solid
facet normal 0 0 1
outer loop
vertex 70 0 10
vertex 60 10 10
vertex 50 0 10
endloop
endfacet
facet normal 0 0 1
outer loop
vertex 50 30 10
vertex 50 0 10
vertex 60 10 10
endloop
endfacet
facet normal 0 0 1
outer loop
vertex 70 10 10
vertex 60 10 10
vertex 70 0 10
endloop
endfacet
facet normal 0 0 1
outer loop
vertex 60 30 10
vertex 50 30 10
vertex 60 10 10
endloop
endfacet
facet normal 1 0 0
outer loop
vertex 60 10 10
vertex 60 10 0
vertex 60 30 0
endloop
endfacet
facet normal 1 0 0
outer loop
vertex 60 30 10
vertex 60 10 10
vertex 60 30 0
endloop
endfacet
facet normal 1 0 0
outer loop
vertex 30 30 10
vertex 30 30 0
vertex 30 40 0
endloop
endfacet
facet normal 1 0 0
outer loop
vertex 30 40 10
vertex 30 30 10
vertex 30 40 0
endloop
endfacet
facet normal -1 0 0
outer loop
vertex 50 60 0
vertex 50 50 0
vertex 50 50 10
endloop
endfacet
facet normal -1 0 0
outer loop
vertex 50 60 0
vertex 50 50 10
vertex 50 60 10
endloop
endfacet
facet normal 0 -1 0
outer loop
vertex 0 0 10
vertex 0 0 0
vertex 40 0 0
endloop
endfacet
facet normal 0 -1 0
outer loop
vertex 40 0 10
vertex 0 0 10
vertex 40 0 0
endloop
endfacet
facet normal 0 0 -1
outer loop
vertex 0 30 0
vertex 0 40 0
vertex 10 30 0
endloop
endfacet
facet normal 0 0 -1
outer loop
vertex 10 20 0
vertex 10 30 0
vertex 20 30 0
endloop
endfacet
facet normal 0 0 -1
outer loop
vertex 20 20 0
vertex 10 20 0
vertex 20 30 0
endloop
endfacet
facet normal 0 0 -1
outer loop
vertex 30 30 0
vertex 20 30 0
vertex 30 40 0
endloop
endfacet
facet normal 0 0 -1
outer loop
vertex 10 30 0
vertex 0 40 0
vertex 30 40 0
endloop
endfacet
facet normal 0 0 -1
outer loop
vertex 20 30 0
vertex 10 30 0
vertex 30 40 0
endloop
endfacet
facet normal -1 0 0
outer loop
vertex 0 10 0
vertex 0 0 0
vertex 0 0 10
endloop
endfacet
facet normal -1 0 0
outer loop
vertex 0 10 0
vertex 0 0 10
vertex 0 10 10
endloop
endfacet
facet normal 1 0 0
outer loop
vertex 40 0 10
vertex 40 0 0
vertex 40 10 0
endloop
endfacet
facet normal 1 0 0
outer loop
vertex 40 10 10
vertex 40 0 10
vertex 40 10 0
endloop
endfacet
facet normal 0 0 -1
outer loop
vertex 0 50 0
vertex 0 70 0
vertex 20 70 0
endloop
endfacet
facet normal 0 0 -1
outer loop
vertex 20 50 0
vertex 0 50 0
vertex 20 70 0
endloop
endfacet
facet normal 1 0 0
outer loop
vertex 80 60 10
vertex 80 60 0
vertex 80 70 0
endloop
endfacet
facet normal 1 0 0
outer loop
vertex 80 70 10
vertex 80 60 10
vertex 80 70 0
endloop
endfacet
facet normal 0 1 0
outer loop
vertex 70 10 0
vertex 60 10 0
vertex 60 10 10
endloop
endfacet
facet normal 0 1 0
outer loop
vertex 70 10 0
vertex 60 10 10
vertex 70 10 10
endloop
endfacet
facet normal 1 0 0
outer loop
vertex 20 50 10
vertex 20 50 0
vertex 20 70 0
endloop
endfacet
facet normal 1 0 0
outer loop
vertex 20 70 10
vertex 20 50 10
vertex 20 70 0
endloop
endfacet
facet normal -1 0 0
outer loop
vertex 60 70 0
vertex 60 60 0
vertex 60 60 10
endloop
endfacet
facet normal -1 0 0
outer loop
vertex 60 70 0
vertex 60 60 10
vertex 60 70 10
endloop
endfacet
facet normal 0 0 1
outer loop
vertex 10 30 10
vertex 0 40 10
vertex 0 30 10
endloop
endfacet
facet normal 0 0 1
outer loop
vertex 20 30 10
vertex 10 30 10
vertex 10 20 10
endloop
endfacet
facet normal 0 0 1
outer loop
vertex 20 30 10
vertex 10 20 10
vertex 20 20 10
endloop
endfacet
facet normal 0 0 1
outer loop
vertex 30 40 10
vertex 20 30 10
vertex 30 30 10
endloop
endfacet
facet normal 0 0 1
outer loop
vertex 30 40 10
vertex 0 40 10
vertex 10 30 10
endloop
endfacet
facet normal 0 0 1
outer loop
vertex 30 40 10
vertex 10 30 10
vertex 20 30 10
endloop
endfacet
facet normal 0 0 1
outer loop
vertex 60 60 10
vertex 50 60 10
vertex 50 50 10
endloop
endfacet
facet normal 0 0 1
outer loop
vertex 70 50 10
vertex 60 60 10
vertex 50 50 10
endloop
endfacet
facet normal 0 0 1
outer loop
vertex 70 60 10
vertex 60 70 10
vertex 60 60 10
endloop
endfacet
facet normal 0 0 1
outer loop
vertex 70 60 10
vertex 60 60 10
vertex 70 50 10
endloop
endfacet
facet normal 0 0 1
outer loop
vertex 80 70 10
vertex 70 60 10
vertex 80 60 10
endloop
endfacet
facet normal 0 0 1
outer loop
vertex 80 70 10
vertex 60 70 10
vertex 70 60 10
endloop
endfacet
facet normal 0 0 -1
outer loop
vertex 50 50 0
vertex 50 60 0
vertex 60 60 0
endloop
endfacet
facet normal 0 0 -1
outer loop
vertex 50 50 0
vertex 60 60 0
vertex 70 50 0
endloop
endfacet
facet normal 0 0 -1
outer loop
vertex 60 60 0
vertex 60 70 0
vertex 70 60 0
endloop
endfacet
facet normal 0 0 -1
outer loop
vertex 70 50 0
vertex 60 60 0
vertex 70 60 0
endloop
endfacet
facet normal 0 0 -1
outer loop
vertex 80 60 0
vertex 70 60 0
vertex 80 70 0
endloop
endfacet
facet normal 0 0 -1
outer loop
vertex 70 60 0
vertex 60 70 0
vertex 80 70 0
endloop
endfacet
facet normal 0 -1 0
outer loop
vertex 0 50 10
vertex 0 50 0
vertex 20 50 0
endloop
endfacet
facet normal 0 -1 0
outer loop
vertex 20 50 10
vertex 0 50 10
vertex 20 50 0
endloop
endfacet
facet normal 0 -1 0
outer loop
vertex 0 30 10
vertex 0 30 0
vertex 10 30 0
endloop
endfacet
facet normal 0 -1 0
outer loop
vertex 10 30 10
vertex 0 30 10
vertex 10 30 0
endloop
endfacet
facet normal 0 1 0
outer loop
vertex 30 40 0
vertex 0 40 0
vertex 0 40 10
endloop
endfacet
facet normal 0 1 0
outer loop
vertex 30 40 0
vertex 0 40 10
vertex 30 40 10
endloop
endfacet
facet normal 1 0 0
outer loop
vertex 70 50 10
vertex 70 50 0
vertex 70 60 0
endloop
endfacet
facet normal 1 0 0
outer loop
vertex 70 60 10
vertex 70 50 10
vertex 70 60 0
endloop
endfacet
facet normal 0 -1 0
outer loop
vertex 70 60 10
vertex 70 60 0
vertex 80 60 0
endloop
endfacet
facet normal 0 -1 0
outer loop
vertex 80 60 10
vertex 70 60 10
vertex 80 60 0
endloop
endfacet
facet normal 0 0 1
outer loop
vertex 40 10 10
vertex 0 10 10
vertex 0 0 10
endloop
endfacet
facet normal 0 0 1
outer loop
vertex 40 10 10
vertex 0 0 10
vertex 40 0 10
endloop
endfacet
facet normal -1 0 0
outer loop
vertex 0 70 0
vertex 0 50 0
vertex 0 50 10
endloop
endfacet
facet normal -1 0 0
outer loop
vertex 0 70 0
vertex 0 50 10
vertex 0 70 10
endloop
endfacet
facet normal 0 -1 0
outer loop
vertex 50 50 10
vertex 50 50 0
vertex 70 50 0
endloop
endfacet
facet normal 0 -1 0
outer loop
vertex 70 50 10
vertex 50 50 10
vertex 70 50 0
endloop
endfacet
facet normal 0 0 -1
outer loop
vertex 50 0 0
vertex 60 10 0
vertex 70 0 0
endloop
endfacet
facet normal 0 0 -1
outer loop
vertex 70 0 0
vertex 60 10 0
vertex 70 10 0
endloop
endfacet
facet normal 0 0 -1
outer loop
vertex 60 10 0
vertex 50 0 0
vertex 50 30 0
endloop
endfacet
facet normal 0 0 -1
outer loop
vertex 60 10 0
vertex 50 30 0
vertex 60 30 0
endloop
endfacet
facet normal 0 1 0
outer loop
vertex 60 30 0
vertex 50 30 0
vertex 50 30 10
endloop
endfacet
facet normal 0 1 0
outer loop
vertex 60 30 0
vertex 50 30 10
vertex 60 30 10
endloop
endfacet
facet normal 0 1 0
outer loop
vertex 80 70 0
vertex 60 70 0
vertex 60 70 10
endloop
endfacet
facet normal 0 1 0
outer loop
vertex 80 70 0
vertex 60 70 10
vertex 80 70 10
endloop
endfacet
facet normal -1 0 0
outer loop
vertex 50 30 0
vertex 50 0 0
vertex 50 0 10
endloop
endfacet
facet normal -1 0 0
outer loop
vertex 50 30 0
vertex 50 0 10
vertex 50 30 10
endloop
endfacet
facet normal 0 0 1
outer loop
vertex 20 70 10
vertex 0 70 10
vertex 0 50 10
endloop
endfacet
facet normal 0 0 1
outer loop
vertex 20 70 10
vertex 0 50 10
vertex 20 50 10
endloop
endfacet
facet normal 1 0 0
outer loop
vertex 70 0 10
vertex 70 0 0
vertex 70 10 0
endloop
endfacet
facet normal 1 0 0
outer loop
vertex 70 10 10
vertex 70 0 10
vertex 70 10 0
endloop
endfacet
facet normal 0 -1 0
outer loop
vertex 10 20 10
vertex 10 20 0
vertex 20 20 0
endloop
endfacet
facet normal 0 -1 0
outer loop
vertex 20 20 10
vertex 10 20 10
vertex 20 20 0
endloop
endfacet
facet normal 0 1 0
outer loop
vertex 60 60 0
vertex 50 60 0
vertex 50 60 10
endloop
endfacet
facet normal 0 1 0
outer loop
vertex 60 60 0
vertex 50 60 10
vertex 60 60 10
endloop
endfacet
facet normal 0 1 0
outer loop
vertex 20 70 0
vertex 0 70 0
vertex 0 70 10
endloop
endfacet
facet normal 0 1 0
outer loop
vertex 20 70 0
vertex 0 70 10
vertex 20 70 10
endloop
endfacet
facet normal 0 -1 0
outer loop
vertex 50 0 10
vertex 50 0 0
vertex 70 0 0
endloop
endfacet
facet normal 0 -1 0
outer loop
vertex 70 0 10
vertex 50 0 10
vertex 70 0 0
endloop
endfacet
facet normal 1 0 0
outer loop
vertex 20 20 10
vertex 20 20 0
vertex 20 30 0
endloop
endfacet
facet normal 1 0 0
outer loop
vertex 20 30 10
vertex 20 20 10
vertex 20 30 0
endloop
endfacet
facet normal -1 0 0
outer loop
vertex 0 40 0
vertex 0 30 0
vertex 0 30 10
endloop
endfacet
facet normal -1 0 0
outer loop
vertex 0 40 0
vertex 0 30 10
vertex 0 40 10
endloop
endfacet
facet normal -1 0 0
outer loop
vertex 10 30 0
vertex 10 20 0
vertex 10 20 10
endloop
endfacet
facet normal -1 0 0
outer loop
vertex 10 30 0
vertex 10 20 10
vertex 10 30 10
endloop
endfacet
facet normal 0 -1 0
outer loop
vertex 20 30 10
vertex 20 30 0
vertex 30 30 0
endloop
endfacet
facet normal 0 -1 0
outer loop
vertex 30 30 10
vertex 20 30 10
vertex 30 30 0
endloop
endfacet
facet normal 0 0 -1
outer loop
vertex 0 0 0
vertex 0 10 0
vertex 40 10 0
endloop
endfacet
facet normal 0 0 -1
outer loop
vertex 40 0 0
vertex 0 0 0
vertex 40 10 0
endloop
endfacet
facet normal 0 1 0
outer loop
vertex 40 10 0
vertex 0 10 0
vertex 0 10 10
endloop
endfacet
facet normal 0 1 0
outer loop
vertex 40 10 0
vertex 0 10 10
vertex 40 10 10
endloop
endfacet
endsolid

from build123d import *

# Parameters (mm, degrees)
BOX_W        = 40
BOX_H        = 10
BOX_DEPTH    = 10
BOX001_W     = 10
BOX001_H     = 10
BOX001_DEPTH = 10
BOX002_W     = 30
BOX002_H     = 10
BOX002_DEPTH = 10
BOX004_W     = 10
BOX004_H     = 30
BOX004_DEPTH = 10
BOX003_W     = 20
BOX003_H     = 10
BOX003_DEPTH = 10
BOX006_W     = 20
BOX006_H     = 10
BOX006_DEPTH = 10
BOX005_W     = 20
BOX005_H     = 10
BOX005_DEPTH = 10
BOX008_W     = 20
BOX008_H     = 10
BOX008_DEPTH = 10
BOX007_W     = 20
BOX007_H     = 10
BOX007_DEPTH = 10


with BuildPart() as box:
    # Box → Box (new body)
    with BuildSketch(Plane.XY):
        with Locations((20, 5)):
            Rectangle(BOX_W, BOX_H)
    extrude(amount=BOX_DEPTH)


with BuildPart() as cub001:
    # Box001 → Box001 (new body)
    with BuildSketch(Plane(origin=(10, 20, 0), x_dir=(1, 0, 0), z_dir=(0, 0, 1))):
        with Locations((5, 5)):
            Rectangle(BOX001_W, BOX001_H)
    extrude(amount=BOX001_DEPTH)


with BuildPart() as figura2:
    # Box002 → Box002 (new body)
    with BuildSketch(Plane(origin=(0, 30, 0), x_dir=(1, 0, 0), z_dir=(0, 0, 1))):
        with Locations((15, 5)):
            Rectangle(BOX002_W, BOX002_H)
    extrude(amount=BOX002_DEPTH)

    # Fusion: union Cub001
    add(cub001.part)


with BuildPart() as cub003:
    # Box004 → Box004 (new body)
    with BuildSketch(Plane(origin=(50, 0, 0), x_dir=(1, 0, 0), z_dir=(0, 0, 1))):
        with Locations((5, 15)):
            Rectangle(BOX004_W, BOX004_H)
    extrude(amount=BOX004_DEPTH)


with BuildPart() as figura3:
    # Box003 → Box003 (new body)
    with BuildSketch(Plane(origin=(50, 0, 0), x_dir=(1, 0, 0), z_dir=(0, 0, 1))):
        with Locations((10, 5)):
            Rectangle(BOX003_W, BOX003_H)
    extrude(amount=BOX003_DEPTH)

    # Fusion002: union Cub003
    add(cub003.part)


with BuildPart() as cub005:
    # Box006 → Box006 (new body)
    with BuildSketch(Plane(origin=(0, 60, 0), x_dir=(1, 0, 0), z_dir=(0, 0, 1))):
        with Locations((10, 5)):
            Rectangle(BOX006_W, BOX006_H)
    extrude(amount=BOX006_DEPTH)


with BuildPart() as fusion005:
    # Box005 → Box005 (new body)
    with BuildSketch(Plane(origin=(0, 50, 0), x_dir=(1, 0, 0), z_dir=(0, 0, 1))):
        with Locations((10, 5)):
            Rectangle(BOX005_W, BOX005_H)
    extrude(amount=BOX005_DEPTH)

    # Fusion004: union Cub005
    add(cub005.part)


with BuildPart() as cub007:
    # Box008 → Box008 (new body)
    with BuildSketch(Plane(origin=(60, 60, 0), x_dir=(1, 0, 0), z_dir=(0, 0, 1))):
        with Locations((10, 5)):
            Rectangle(BOX008_W, BOX008_H)
    extrude(amount=BOX008_DEPTH)


with BuildPart() as fusion007:
    # Box007 → Box007 (new body)
    with BuildSketch(Plane(origin=(50, 50, 0), x_dir=(1, 0, 0), z_dir=(0, 0, 1))):
        with Locations((10, 5)):
            Rectangle(BOX007_W, BOX007_H)
    extrude(amount=BOX007_DEPTH)

    # Fusion006: union Cub007
    add(cub007.part)


solid = Compound([box.part, figura2.part, figura3.part, fusion005.part, fusion007.part])
